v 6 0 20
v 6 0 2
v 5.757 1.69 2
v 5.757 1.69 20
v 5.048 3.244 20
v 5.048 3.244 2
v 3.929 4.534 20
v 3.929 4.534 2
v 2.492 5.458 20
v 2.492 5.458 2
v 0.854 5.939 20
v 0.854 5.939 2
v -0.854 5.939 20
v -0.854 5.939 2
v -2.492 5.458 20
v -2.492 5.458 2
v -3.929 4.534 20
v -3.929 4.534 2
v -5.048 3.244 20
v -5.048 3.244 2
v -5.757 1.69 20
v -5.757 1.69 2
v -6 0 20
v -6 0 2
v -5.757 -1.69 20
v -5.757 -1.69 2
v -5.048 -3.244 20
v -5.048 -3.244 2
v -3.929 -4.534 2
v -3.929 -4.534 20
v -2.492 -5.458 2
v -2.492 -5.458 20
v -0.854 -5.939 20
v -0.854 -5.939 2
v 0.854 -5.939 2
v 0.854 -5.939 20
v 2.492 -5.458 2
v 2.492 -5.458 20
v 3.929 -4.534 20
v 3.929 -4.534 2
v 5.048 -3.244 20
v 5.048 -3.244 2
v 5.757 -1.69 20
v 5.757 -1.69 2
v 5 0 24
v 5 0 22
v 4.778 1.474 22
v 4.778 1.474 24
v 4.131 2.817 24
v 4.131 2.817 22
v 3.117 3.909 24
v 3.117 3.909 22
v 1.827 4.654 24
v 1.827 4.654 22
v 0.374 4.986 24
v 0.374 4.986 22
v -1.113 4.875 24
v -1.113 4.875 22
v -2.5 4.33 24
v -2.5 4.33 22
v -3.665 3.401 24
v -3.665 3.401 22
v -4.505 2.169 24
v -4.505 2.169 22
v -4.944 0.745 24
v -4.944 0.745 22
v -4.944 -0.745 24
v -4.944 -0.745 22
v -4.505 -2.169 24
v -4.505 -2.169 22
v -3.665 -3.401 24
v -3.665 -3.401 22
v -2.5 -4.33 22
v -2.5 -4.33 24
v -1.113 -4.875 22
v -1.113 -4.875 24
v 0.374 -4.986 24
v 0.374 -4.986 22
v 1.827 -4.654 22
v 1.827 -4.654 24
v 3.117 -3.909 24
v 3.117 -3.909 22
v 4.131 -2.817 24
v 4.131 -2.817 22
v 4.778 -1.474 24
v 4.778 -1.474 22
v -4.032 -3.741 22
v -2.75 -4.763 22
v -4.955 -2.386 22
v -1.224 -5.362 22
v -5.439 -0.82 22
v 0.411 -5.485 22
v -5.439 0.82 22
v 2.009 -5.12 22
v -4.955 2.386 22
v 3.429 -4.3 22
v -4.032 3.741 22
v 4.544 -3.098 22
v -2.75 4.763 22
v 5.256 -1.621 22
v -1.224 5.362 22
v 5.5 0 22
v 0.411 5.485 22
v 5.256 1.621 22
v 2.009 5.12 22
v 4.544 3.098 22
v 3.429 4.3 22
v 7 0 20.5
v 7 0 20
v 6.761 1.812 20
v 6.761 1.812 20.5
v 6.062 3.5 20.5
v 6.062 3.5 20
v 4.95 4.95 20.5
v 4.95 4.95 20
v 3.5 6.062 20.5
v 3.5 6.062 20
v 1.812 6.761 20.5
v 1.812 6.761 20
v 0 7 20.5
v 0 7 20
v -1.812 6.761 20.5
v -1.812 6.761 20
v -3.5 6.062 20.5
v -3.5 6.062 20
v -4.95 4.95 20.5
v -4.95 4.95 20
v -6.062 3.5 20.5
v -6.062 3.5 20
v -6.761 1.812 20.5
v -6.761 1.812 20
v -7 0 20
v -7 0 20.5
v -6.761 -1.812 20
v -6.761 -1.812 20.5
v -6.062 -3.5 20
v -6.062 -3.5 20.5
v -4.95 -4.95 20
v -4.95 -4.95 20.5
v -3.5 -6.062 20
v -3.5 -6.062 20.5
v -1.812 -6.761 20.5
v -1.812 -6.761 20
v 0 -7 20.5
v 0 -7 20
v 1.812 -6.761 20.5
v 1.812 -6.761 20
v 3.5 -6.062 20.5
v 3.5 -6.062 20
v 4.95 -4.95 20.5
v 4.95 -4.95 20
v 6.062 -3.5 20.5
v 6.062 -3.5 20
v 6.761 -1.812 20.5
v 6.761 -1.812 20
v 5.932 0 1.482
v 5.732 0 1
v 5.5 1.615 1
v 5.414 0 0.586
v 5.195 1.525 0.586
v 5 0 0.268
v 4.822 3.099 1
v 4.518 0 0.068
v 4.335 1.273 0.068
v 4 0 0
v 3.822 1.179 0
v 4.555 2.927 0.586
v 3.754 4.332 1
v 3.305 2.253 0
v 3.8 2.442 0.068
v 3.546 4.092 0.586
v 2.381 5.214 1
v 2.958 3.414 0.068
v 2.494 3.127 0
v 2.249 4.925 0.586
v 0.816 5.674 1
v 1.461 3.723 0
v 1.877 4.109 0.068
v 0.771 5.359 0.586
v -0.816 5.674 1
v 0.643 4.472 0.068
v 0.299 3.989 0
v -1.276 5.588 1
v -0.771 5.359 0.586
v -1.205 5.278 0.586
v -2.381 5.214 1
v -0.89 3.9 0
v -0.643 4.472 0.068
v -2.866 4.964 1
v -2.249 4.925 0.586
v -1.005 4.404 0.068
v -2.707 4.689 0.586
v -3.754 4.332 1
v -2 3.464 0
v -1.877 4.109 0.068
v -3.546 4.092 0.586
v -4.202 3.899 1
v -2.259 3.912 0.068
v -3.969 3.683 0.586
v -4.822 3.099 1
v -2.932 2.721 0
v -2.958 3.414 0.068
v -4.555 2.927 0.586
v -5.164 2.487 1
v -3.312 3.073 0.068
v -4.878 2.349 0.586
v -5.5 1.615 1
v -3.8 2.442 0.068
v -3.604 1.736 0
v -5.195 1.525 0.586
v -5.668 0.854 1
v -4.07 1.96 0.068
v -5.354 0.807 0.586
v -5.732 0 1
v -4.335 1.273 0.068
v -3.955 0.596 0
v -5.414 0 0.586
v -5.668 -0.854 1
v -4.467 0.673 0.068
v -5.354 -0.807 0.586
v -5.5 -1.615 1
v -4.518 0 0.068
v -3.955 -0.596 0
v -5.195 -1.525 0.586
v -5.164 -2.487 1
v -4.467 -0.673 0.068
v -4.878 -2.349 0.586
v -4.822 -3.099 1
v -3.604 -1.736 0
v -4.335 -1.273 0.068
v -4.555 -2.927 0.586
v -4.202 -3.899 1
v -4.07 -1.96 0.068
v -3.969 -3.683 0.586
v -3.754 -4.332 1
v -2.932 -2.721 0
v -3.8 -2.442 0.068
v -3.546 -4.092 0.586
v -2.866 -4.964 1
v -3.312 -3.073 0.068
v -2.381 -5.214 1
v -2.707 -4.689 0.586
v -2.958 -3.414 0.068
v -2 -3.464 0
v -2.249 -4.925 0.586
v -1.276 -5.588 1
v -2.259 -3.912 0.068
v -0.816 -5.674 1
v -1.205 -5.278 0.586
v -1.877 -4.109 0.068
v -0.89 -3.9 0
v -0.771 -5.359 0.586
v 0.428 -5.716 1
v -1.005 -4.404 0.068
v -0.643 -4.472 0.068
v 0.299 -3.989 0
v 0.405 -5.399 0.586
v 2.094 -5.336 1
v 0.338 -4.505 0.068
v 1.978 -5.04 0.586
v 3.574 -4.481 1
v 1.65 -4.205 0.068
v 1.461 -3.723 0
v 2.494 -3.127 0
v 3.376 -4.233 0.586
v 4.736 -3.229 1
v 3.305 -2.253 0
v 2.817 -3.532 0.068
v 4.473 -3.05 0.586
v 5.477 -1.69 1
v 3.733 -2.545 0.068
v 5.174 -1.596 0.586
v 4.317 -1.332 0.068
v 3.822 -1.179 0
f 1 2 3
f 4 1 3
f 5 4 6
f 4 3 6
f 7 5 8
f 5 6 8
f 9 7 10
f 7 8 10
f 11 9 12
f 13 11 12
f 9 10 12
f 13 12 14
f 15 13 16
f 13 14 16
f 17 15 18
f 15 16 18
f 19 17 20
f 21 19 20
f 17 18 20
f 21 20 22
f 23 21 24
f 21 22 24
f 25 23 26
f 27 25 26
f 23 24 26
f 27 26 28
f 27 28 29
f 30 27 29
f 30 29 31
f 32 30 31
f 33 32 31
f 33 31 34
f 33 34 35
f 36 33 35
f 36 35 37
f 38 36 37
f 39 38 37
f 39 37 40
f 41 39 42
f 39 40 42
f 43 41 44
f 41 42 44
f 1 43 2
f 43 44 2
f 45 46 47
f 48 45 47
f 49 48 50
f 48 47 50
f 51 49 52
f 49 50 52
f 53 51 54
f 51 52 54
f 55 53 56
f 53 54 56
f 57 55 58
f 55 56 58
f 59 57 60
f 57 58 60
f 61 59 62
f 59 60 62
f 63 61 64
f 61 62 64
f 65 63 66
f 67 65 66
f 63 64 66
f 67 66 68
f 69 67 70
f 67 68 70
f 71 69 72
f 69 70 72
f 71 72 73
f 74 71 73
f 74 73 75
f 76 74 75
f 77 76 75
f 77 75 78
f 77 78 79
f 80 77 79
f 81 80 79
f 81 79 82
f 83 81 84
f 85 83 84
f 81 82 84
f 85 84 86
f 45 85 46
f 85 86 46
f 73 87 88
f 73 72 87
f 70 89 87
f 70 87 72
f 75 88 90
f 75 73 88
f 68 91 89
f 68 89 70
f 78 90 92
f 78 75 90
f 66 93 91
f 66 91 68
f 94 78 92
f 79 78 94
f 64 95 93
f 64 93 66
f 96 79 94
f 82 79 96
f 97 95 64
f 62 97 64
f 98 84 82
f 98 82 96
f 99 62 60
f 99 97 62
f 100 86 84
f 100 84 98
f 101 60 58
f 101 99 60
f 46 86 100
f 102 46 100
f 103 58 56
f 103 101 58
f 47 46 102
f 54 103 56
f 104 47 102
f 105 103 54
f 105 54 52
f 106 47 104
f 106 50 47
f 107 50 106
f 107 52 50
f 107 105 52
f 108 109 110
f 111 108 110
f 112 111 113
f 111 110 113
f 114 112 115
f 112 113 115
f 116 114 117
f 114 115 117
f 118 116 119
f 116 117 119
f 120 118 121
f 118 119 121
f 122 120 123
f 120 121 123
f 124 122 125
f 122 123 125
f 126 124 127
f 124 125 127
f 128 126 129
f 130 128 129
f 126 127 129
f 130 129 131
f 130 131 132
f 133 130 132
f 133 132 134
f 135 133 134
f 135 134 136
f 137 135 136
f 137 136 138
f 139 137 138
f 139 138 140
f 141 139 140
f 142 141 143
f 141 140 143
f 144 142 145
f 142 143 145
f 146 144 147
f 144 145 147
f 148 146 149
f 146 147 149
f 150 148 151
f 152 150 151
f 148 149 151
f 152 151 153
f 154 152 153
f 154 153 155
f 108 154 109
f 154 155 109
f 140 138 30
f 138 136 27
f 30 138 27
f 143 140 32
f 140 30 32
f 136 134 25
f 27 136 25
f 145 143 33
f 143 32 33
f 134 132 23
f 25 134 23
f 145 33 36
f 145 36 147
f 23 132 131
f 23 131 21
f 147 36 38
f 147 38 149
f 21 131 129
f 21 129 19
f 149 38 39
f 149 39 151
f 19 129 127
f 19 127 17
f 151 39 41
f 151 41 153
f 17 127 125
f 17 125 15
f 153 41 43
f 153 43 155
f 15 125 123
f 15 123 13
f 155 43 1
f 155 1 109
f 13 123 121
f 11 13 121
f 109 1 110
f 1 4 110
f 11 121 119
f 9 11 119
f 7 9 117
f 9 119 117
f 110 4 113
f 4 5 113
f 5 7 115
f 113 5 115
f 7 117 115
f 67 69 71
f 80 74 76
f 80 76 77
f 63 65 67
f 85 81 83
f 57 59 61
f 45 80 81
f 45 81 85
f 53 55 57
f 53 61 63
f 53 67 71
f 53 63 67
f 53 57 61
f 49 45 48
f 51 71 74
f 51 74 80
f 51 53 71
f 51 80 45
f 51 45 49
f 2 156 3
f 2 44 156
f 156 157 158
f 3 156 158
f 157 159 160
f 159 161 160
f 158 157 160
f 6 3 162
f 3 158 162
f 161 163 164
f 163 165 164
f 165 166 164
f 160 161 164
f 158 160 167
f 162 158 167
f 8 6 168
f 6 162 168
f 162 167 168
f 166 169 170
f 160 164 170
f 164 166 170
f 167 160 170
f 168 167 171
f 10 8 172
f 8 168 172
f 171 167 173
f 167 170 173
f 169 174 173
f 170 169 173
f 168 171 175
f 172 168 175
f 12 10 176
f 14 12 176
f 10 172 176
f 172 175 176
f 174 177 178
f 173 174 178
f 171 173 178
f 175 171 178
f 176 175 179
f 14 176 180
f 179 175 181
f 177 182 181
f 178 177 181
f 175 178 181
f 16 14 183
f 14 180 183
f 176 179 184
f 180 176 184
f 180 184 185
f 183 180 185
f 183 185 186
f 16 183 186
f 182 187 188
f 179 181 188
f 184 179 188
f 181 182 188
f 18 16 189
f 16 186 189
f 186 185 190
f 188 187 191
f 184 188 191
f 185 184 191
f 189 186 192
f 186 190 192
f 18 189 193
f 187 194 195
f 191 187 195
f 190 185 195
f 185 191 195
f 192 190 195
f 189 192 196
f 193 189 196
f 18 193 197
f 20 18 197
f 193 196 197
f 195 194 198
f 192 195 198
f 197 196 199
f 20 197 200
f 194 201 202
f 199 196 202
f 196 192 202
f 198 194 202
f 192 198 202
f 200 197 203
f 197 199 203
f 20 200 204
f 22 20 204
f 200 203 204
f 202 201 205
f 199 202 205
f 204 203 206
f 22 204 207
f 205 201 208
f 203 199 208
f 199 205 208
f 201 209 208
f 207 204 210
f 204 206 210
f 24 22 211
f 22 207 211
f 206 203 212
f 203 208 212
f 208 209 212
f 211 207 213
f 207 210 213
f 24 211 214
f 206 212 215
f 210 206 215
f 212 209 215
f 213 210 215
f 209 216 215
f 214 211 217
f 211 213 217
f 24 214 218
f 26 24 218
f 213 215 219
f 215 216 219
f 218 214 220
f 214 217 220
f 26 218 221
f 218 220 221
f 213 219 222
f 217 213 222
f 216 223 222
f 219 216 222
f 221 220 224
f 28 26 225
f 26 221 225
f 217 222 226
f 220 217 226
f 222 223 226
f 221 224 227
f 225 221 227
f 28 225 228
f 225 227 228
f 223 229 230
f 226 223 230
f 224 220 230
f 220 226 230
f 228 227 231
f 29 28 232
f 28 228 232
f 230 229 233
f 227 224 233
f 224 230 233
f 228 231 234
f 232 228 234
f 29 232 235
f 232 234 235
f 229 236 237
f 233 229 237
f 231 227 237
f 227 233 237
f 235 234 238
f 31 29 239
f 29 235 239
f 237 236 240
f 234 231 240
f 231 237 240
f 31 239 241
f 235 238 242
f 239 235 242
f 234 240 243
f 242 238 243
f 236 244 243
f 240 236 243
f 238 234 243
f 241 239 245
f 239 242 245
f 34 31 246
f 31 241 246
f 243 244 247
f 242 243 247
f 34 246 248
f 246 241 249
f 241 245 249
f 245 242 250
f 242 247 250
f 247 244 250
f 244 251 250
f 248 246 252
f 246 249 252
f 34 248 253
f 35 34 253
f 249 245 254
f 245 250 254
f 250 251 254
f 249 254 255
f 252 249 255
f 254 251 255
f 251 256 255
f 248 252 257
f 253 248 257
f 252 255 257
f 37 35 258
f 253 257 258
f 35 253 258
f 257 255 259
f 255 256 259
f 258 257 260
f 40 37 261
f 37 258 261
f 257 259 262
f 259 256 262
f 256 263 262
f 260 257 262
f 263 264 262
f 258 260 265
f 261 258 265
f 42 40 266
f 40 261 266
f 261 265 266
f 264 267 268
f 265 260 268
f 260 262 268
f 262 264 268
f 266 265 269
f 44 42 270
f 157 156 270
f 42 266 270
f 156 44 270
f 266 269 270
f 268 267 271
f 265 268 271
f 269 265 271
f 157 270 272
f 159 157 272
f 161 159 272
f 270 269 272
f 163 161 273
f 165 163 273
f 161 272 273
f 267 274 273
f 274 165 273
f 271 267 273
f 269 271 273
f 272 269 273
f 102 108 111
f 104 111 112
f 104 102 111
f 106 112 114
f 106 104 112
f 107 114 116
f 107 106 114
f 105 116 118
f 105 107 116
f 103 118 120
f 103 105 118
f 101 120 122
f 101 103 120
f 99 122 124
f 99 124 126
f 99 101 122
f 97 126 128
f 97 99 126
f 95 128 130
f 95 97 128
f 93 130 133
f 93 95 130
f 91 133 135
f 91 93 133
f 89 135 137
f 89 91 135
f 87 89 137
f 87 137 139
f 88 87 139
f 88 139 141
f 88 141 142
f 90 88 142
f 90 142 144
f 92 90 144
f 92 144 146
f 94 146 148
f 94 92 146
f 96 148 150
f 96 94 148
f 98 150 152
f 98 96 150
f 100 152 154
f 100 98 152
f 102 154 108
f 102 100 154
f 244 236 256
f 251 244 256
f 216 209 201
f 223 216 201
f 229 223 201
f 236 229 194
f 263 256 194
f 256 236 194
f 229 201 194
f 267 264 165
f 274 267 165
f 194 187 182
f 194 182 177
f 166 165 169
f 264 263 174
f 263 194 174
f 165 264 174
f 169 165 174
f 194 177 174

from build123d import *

# Parameters (mm, degrees)
SKETCH_R     = 6
PAD_DEPTH    = 20
SKETCH001_R  = 7
PAD001_DEPTH = 2
CHAMFER_SIZE = 1.5
SKETCH002_R  = 5
PAD002_DEPTH = 2
FILLET_R     = 2


with BuildPart() as part:
    # Sketch → Pad (new body)
    with BuildSketch(Plane.XY):
        Circle(SKETCH_R)
    extrude(amount=PAD_DEPTH)

    # Sketch001 (on Face3 of Pad) → Pad001 (join)
    with BuildSketch(Plane.XY.offset(20)):
        Circle(SKETCH001_R)
    extrude(amount=PAD001_DEPTH)

    # Chamfer
    chamfer_edges = [part.edges().sort_by_distance(p)[0] for p in [
        (-7, 0, 22),
    ]]
    chamfer(chamfer_edges, length=CHAMFER_SIZE)

    # Sketch002 (on Face4 of Chamfer) → Pad002 (join)
    with BuildSketch(Plane.XY.offset(22)):
        Circle(SKETCH002_R)
    extrude(amount=PAD002_DEPTH)

    # Fillet
    fillet_edges = [part.edges().sort_by_distance(p)[0] for p in [
        (-6, 0, 0),
    ]]
    fillet(fillet_edges, radius=FILLET_R)


solid = part.part
